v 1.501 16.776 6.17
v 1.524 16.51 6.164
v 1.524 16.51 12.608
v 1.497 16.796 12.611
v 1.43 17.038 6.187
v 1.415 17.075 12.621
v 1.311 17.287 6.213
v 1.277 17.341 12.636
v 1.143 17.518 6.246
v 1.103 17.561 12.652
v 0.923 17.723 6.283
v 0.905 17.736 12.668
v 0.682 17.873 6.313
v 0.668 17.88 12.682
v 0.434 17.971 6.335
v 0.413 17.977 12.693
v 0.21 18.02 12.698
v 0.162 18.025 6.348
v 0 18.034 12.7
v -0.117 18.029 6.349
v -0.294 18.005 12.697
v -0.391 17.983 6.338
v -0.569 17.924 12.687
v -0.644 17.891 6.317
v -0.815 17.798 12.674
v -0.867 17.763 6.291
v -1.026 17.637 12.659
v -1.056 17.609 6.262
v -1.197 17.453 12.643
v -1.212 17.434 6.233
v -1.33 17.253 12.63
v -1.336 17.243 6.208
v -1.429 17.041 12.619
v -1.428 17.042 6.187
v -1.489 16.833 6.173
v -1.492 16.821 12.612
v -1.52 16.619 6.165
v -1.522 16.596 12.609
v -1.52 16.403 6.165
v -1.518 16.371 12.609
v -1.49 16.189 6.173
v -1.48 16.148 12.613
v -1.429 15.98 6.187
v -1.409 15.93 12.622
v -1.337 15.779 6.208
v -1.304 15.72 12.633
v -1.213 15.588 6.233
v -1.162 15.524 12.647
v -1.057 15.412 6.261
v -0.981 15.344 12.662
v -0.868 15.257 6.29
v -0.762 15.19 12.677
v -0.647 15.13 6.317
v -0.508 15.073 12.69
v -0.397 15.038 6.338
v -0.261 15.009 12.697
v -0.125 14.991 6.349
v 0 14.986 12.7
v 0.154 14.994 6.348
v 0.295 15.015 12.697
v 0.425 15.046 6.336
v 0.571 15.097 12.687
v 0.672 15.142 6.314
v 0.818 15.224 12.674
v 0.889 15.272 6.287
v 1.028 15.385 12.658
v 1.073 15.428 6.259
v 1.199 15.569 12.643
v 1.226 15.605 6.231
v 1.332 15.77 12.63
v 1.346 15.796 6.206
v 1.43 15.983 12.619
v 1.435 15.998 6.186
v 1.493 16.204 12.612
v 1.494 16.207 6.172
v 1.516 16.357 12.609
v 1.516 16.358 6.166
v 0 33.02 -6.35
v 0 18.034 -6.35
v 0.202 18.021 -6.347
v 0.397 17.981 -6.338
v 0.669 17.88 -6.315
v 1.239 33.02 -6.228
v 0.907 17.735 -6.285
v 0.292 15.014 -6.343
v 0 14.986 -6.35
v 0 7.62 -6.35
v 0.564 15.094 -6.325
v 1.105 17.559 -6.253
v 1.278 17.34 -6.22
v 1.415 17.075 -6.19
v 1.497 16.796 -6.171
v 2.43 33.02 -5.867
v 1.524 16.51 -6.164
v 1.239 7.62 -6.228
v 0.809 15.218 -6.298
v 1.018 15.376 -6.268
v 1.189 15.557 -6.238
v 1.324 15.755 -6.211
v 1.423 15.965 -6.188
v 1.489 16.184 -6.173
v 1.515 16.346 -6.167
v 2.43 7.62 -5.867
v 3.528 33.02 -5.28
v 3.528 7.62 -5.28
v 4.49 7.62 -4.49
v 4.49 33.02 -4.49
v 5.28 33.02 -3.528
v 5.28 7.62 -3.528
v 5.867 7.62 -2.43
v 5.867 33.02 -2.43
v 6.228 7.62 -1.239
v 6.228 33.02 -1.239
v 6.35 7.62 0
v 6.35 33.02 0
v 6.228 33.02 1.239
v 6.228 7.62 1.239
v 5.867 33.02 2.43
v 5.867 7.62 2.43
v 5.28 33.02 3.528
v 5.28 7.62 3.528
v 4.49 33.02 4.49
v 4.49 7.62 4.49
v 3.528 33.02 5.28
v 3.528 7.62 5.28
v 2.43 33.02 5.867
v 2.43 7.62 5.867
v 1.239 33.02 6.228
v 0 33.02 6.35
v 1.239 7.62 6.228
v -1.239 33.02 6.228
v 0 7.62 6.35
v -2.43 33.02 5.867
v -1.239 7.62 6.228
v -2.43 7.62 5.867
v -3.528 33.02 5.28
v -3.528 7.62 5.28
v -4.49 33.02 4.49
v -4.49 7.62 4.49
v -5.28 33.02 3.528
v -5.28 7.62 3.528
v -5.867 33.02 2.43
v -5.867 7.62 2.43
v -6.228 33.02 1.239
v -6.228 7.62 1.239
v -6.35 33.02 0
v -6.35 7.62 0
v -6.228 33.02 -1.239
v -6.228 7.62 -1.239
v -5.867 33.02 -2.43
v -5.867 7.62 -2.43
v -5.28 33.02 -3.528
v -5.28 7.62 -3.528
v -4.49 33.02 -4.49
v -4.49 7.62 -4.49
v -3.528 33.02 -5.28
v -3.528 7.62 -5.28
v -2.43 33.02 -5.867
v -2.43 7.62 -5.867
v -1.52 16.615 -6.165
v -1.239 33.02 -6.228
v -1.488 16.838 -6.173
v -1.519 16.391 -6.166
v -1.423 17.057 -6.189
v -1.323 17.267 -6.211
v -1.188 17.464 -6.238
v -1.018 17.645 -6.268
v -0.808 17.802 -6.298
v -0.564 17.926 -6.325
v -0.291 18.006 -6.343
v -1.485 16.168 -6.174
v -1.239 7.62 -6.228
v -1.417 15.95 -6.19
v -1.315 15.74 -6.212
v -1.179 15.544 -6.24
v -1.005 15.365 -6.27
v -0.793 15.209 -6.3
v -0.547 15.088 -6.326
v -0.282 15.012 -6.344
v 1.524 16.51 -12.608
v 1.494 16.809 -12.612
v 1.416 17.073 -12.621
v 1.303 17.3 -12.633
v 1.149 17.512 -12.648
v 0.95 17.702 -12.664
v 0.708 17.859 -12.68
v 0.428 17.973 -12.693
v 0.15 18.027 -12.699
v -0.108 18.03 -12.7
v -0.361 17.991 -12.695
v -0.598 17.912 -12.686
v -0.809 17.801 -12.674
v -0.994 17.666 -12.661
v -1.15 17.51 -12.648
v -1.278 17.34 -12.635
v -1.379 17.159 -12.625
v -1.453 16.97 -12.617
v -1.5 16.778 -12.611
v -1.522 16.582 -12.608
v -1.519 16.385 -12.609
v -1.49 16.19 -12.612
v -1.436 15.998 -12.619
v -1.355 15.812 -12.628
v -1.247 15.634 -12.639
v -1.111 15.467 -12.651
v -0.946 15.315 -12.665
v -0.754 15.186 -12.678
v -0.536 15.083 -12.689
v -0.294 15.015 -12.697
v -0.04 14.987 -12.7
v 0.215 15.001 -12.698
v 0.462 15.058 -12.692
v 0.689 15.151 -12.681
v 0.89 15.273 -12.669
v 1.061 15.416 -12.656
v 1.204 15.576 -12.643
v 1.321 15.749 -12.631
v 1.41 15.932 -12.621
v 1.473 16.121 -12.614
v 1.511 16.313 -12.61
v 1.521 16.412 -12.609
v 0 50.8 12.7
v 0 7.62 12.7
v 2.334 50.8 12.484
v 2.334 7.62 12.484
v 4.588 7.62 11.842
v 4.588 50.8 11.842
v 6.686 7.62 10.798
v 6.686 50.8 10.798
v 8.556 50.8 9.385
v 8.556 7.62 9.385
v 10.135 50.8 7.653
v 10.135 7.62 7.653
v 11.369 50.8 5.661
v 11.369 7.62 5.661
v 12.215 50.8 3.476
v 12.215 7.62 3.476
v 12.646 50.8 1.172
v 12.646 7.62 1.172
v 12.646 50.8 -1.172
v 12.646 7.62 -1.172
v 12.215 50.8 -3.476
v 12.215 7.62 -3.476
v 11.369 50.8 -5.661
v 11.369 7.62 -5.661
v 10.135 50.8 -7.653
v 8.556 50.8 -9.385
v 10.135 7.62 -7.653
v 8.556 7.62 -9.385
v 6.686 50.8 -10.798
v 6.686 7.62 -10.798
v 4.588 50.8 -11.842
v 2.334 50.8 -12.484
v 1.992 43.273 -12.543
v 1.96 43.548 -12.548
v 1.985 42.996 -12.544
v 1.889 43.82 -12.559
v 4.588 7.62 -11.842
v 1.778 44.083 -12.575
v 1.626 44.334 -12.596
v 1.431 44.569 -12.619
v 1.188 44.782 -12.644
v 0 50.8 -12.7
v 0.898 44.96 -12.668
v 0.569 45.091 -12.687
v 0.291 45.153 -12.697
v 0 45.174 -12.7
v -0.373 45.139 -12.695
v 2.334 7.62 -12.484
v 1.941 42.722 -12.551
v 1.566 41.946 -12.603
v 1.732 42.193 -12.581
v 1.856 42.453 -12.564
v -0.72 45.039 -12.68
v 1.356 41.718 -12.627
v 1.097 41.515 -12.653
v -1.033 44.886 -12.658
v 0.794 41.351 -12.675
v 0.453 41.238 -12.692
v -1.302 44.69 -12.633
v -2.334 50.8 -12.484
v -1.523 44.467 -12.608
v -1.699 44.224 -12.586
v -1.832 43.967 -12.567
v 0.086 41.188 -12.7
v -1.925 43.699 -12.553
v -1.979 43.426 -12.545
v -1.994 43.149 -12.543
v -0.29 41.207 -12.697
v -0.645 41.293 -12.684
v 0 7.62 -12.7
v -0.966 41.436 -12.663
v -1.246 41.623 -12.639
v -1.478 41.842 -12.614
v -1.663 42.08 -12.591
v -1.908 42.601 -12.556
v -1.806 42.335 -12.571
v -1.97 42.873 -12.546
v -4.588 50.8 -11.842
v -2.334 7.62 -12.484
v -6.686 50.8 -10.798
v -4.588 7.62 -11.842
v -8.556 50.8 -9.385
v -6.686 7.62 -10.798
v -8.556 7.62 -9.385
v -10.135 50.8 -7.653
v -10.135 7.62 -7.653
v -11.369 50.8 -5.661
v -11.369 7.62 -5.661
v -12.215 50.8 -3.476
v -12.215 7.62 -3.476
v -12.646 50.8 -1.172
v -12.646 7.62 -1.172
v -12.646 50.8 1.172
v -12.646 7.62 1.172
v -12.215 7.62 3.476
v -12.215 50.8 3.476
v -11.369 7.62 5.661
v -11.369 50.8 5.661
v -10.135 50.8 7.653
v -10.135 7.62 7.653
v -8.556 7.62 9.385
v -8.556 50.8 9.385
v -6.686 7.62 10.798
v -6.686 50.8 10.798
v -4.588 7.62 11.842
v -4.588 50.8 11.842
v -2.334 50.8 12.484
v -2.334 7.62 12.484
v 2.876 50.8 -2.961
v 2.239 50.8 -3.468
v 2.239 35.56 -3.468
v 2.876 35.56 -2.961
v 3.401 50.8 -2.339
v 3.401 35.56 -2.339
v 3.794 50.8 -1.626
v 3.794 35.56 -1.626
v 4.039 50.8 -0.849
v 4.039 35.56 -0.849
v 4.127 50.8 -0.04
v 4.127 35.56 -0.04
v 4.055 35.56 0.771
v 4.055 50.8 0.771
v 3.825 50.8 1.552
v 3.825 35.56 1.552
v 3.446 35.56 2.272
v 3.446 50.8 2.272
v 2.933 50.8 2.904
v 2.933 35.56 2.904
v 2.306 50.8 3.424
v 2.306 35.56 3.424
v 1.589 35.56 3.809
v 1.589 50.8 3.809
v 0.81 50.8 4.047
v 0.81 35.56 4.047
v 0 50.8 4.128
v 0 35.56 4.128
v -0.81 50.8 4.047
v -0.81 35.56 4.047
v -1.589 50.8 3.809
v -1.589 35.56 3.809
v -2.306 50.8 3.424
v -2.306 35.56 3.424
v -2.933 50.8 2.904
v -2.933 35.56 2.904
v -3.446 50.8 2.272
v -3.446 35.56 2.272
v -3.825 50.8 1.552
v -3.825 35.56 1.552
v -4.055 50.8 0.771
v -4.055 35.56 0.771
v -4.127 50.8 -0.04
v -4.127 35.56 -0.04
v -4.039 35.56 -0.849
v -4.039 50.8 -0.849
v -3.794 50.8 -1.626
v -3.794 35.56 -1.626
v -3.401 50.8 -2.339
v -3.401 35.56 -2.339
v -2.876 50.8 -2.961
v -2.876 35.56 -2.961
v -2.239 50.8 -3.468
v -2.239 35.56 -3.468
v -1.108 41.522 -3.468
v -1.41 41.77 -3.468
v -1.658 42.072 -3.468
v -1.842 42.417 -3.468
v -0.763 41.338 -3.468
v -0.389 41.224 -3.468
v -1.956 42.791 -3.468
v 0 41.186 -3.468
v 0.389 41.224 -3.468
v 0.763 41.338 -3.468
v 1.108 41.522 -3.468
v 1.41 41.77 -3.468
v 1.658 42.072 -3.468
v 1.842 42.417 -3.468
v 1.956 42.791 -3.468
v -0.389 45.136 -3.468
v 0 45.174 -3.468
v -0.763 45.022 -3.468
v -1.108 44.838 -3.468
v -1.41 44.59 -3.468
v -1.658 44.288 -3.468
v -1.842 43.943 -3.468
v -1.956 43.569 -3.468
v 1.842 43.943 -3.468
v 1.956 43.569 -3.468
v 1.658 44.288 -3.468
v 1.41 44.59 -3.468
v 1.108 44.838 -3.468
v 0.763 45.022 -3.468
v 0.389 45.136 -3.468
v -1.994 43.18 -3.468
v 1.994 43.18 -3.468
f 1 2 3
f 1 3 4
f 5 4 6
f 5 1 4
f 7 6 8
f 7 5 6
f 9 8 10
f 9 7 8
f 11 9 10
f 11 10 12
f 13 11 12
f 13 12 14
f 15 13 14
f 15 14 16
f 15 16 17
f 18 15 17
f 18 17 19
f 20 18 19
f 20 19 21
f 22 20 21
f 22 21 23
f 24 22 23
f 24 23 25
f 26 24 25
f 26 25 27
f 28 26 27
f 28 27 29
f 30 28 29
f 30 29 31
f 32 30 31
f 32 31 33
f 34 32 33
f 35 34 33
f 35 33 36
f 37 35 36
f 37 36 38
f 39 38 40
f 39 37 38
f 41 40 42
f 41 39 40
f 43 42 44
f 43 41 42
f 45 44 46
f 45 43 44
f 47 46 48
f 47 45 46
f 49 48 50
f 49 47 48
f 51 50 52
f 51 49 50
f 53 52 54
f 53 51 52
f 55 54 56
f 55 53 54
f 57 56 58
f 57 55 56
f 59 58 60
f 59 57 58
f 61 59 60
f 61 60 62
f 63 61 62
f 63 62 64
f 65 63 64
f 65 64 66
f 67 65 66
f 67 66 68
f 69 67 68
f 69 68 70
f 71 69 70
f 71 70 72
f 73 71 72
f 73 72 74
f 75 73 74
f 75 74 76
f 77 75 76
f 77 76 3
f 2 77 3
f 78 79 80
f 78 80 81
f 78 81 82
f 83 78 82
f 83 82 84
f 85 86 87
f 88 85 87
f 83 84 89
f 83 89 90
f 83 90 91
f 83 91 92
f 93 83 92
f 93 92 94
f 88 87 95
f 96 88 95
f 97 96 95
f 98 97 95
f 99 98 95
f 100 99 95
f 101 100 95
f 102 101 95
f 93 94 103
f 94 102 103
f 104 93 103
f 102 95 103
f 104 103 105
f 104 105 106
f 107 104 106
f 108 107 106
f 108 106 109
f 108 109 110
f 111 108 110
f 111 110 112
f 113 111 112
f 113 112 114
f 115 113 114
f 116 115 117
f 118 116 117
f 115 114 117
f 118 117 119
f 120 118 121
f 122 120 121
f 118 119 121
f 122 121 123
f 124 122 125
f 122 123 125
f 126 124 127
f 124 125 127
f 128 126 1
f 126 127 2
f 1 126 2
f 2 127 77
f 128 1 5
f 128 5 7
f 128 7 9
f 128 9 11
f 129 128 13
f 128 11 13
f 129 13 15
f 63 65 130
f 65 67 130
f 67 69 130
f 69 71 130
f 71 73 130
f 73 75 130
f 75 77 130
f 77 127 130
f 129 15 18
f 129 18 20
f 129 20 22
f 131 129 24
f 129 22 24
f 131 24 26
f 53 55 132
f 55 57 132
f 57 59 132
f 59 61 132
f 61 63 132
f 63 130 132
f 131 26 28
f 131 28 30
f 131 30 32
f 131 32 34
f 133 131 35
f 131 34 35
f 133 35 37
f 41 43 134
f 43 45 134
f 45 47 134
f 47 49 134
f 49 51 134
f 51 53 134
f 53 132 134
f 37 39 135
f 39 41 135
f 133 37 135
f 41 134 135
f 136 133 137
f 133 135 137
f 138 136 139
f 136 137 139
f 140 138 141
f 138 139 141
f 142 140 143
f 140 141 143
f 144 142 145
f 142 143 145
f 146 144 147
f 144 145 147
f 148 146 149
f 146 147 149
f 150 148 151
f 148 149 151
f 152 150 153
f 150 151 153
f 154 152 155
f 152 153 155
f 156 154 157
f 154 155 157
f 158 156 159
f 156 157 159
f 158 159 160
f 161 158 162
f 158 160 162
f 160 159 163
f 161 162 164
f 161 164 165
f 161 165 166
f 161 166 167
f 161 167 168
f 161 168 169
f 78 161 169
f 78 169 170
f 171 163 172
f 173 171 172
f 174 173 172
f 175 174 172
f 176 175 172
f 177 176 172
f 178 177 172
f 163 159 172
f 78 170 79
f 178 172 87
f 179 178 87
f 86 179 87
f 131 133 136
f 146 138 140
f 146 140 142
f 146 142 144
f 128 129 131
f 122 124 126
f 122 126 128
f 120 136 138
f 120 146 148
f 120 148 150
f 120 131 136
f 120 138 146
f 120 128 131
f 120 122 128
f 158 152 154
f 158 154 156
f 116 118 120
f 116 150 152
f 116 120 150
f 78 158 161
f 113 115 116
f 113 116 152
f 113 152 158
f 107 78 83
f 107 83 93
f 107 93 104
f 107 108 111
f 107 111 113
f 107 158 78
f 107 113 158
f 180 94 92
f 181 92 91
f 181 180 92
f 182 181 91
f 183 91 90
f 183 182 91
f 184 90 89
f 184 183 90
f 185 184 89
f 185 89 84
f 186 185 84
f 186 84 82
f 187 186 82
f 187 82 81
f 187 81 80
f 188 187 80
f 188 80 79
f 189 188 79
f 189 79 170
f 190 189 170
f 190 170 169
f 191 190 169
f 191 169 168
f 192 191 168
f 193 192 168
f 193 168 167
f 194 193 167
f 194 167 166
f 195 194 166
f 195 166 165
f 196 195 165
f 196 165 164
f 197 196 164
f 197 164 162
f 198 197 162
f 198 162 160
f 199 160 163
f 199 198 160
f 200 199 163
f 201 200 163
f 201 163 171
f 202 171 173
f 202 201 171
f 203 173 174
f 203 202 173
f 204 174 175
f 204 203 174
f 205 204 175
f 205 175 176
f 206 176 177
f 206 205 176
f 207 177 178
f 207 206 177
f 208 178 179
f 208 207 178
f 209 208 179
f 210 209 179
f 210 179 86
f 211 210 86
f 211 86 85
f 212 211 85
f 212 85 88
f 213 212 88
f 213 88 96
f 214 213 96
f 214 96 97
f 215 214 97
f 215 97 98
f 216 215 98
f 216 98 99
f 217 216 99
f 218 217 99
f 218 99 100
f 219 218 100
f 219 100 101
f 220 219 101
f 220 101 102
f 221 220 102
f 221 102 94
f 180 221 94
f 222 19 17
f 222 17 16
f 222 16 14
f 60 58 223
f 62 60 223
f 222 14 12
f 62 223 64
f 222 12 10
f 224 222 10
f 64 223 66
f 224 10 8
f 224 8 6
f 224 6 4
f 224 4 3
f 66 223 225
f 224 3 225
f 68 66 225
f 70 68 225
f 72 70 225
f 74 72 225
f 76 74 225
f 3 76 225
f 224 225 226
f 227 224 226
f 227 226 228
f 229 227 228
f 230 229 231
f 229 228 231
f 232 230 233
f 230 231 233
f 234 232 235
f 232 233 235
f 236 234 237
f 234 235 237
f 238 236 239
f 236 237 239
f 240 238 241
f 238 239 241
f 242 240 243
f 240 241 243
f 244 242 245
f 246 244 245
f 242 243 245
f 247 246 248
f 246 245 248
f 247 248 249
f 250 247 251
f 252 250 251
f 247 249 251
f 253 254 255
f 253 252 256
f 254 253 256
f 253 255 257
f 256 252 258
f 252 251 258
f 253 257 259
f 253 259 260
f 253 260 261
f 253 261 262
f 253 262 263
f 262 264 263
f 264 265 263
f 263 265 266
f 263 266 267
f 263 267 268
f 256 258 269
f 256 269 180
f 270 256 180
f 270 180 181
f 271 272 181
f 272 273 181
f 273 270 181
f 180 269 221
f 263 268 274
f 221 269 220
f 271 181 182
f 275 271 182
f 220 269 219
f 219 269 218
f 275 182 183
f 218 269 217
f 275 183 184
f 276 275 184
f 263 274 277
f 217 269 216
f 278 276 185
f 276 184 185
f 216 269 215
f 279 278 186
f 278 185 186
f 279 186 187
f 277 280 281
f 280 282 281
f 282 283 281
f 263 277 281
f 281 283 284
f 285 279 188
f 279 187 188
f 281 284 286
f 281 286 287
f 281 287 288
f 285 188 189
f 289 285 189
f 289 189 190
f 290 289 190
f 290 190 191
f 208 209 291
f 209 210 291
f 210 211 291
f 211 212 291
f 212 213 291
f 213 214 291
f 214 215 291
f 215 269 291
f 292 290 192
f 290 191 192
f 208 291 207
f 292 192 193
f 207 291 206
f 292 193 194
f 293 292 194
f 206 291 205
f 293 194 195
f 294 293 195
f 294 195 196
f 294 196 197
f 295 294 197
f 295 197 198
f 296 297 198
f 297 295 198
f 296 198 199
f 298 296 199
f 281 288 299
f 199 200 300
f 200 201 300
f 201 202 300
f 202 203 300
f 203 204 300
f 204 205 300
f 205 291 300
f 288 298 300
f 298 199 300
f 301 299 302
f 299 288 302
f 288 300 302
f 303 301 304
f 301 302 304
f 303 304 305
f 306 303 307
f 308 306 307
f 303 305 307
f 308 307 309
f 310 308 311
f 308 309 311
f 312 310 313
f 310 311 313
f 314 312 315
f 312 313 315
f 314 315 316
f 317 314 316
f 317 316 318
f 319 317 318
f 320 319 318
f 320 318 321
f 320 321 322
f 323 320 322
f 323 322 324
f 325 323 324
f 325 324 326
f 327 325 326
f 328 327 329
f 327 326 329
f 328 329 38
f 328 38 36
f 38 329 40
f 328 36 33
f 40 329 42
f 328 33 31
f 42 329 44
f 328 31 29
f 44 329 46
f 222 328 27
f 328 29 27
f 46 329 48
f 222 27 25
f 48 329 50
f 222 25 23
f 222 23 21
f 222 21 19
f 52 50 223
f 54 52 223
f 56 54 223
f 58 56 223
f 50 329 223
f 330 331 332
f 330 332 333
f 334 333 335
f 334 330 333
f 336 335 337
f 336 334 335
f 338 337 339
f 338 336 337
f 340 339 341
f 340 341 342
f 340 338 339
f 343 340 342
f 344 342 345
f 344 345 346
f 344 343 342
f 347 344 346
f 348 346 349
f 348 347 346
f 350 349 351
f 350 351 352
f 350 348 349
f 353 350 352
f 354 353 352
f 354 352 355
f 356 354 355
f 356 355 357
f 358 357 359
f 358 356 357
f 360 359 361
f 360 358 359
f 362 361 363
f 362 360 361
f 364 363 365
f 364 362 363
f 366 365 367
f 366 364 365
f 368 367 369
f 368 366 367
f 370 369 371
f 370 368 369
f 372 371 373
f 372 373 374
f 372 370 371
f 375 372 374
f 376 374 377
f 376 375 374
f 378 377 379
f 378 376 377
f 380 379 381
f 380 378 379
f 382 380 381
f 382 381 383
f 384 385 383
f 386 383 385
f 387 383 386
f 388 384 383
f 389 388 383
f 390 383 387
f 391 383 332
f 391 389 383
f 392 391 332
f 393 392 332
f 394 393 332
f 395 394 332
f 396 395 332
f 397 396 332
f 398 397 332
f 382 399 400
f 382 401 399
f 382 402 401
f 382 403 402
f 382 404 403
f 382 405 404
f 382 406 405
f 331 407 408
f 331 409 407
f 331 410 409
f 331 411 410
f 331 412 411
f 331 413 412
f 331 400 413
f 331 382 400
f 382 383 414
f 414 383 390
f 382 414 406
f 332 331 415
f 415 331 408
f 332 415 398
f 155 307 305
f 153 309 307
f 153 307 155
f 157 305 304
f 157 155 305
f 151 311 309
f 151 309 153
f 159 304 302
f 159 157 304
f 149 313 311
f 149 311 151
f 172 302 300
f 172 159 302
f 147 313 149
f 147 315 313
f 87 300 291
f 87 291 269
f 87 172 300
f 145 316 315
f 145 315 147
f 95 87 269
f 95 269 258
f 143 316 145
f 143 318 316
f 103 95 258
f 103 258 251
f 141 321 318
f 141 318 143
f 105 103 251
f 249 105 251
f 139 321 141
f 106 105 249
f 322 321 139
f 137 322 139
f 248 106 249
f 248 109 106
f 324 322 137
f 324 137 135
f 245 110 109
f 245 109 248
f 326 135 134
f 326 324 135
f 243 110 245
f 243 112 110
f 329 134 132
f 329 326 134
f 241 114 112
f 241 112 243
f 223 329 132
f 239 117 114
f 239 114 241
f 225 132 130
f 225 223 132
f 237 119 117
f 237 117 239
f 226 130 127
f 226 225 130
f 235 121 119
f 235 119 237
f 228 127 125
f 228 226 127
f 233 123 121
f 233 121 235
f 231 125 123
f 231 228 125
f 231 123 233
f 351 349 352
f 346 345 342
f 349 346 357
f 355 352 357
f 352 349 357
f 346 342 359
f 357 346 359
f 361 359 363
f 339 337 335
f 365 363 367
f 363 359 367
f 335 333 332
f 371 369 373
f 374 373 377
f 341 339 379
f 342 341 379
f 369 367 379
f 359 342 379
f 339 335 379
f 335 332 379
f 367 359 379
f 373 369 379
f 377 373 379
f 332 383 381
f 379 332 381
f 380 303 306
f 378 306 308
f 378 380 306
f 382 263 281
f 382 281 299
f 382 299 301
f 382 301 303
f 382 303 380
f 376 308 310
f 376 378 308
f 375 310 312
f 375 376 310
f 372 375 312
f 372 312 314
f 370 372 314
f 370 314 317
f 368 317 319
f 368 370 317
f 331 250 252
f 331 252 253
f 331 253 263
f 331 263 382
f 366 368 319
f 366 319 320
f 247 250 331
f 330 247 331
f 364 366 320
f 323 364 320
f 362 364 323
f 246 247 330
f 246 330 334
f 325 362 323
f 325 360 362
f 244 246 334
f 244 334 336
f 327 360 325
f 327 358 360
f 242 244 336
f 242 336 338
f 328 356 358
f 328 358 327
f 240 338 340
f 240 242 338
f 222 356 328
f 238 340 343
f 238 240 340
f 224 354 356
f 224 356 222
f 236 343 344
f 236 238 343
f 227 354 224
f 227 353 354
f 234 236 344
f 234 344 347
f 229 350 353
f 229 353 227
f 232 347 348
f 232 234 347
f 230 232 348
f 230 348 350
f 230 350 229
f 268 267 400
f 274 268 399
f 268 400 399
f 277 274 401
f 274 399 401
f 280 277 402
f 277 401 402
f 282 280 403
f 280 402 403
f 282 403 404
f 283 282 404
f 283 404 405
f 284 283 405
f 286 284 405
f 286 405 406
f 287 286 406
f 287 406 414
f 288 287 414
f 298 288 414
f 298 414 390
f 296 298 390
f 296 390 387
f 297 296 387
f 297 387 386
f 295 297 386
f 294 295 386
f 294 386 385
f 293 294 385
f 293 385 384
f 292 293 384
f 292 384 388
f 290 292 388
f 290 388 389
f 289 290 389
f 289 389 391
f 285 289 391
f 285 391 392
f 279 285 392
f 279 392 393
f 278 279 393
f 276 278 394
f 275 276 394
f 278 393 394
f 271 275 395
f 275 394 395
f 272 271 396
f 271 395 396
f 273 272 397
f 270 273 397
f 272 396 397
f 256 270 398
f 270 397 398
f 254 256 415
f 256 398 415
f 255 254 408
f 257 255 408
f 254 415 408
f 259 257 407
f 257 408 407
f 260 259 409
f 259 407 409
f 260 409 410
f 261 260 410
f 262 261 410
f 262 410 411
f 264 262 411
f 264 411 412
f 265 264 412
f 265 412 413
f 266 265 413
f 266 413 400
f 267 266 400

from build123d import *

# Parameters (mm, degrees)
SKETCH1_R               = 12.7
BOSS_EXTRUDE1_DEPTH     = 50.8
SKETCH4_R               = 6.35
CUT_EXTRUDE2_DEPTH      = 33.02
CUT_EXTRUDE3_DEPTH      = 54.881536726
CUT_EXTRUDE3_DEPTH_BACK = 54.881536726
SKETCH5_R               = 1.524
CUT_EXTRUDE4_DEPTH      = 15.24
SKETCH7_R               = 1.9939
CUT_EXTRUDE5_DEPTH      = 15.24
SKETCH8_R               = 14.2875
CUT_EXTRUDE6_DEPTH      = 7.62


with BuildPart() as part:
    # Sketch1 → Boss-Extrude1 (new body)
    with BuildSketch(Plane(origin=(0, 0, 0), x_dir=(1, 0, 0), z_dir=(0, 1, 0))):
        with Locations(Location((0, 0, 0), (0, 0, 270))):
            Circle(SKETCH1_R)
    extrude(amount=BOSS_EXTRUDE1_DEPTH)

    # Sketch4 → Cut-Extrude2 (cut)
    with BuildSketch(Plane.XZ):
        with Locations(Location((0, 0, 0), (0, 0, 270))):
            Circle(SKETCH4_R)
    extrude(amount=-CUT_EXTRUDE2_DEPTH, mode=Mode.SUBTRACT)

    # Sketch5 → Cut-Extrude3 (cut, two sides: drawn at the far end of the back side and taken through both)
    with BuildSketch(Plane.XY.offset(-CUT_EXTRUDE3_DEPTH_BACK)):
        with Locations((0, 16.51)):
            Circle(SKETCH5_R)
    extrude(amount=CUT_EXTRUDE3_DEPTH + CUT_EXTRUDE3_DEPTH_BACK, mode=Mode.SUBTRACT)

    # Sketch6 → Cut-Extrude4 (cut)
    with BuildSketch(Plane(origin=(0, 50.8, 0), x_dir=(1, 0, 0), z_dir=(0, 1, 0))):
        with BuildLine():
            Line((-2.238756, 3.467596837), (2.238756, 3.467596837))
            ThreePointArc((2.238756, 3.467596837), (0, -4.1275), (-2.238756, 3.467596837))
        make_face()
    extrude(amount=-CUT_EXTRUDE4_DEPTH, mode=Mode.SUBTRACT)

    # Sketch7 → Cut-Extrude5 (cut)
    with BuildSketch(Plane.XY):
        with Locations(Location((0, 43.18, 0), (0, 0, 90))):
            Circle(SKETCH7_R)
    extrude(amount=-CUT_EXTRUDE5_DEPTH, mode=Mode.SUBTRACT)

    # Sketch8 → Cut-Extrude6 (cut)
    with BuildSketch(Plane.XZ):
        Circle(SKETCH8_R)
    extrude(amount=-CUT_EXTRUDE6_DEPTH, mode=Mode.SUBTRACT)


solid = part.part
